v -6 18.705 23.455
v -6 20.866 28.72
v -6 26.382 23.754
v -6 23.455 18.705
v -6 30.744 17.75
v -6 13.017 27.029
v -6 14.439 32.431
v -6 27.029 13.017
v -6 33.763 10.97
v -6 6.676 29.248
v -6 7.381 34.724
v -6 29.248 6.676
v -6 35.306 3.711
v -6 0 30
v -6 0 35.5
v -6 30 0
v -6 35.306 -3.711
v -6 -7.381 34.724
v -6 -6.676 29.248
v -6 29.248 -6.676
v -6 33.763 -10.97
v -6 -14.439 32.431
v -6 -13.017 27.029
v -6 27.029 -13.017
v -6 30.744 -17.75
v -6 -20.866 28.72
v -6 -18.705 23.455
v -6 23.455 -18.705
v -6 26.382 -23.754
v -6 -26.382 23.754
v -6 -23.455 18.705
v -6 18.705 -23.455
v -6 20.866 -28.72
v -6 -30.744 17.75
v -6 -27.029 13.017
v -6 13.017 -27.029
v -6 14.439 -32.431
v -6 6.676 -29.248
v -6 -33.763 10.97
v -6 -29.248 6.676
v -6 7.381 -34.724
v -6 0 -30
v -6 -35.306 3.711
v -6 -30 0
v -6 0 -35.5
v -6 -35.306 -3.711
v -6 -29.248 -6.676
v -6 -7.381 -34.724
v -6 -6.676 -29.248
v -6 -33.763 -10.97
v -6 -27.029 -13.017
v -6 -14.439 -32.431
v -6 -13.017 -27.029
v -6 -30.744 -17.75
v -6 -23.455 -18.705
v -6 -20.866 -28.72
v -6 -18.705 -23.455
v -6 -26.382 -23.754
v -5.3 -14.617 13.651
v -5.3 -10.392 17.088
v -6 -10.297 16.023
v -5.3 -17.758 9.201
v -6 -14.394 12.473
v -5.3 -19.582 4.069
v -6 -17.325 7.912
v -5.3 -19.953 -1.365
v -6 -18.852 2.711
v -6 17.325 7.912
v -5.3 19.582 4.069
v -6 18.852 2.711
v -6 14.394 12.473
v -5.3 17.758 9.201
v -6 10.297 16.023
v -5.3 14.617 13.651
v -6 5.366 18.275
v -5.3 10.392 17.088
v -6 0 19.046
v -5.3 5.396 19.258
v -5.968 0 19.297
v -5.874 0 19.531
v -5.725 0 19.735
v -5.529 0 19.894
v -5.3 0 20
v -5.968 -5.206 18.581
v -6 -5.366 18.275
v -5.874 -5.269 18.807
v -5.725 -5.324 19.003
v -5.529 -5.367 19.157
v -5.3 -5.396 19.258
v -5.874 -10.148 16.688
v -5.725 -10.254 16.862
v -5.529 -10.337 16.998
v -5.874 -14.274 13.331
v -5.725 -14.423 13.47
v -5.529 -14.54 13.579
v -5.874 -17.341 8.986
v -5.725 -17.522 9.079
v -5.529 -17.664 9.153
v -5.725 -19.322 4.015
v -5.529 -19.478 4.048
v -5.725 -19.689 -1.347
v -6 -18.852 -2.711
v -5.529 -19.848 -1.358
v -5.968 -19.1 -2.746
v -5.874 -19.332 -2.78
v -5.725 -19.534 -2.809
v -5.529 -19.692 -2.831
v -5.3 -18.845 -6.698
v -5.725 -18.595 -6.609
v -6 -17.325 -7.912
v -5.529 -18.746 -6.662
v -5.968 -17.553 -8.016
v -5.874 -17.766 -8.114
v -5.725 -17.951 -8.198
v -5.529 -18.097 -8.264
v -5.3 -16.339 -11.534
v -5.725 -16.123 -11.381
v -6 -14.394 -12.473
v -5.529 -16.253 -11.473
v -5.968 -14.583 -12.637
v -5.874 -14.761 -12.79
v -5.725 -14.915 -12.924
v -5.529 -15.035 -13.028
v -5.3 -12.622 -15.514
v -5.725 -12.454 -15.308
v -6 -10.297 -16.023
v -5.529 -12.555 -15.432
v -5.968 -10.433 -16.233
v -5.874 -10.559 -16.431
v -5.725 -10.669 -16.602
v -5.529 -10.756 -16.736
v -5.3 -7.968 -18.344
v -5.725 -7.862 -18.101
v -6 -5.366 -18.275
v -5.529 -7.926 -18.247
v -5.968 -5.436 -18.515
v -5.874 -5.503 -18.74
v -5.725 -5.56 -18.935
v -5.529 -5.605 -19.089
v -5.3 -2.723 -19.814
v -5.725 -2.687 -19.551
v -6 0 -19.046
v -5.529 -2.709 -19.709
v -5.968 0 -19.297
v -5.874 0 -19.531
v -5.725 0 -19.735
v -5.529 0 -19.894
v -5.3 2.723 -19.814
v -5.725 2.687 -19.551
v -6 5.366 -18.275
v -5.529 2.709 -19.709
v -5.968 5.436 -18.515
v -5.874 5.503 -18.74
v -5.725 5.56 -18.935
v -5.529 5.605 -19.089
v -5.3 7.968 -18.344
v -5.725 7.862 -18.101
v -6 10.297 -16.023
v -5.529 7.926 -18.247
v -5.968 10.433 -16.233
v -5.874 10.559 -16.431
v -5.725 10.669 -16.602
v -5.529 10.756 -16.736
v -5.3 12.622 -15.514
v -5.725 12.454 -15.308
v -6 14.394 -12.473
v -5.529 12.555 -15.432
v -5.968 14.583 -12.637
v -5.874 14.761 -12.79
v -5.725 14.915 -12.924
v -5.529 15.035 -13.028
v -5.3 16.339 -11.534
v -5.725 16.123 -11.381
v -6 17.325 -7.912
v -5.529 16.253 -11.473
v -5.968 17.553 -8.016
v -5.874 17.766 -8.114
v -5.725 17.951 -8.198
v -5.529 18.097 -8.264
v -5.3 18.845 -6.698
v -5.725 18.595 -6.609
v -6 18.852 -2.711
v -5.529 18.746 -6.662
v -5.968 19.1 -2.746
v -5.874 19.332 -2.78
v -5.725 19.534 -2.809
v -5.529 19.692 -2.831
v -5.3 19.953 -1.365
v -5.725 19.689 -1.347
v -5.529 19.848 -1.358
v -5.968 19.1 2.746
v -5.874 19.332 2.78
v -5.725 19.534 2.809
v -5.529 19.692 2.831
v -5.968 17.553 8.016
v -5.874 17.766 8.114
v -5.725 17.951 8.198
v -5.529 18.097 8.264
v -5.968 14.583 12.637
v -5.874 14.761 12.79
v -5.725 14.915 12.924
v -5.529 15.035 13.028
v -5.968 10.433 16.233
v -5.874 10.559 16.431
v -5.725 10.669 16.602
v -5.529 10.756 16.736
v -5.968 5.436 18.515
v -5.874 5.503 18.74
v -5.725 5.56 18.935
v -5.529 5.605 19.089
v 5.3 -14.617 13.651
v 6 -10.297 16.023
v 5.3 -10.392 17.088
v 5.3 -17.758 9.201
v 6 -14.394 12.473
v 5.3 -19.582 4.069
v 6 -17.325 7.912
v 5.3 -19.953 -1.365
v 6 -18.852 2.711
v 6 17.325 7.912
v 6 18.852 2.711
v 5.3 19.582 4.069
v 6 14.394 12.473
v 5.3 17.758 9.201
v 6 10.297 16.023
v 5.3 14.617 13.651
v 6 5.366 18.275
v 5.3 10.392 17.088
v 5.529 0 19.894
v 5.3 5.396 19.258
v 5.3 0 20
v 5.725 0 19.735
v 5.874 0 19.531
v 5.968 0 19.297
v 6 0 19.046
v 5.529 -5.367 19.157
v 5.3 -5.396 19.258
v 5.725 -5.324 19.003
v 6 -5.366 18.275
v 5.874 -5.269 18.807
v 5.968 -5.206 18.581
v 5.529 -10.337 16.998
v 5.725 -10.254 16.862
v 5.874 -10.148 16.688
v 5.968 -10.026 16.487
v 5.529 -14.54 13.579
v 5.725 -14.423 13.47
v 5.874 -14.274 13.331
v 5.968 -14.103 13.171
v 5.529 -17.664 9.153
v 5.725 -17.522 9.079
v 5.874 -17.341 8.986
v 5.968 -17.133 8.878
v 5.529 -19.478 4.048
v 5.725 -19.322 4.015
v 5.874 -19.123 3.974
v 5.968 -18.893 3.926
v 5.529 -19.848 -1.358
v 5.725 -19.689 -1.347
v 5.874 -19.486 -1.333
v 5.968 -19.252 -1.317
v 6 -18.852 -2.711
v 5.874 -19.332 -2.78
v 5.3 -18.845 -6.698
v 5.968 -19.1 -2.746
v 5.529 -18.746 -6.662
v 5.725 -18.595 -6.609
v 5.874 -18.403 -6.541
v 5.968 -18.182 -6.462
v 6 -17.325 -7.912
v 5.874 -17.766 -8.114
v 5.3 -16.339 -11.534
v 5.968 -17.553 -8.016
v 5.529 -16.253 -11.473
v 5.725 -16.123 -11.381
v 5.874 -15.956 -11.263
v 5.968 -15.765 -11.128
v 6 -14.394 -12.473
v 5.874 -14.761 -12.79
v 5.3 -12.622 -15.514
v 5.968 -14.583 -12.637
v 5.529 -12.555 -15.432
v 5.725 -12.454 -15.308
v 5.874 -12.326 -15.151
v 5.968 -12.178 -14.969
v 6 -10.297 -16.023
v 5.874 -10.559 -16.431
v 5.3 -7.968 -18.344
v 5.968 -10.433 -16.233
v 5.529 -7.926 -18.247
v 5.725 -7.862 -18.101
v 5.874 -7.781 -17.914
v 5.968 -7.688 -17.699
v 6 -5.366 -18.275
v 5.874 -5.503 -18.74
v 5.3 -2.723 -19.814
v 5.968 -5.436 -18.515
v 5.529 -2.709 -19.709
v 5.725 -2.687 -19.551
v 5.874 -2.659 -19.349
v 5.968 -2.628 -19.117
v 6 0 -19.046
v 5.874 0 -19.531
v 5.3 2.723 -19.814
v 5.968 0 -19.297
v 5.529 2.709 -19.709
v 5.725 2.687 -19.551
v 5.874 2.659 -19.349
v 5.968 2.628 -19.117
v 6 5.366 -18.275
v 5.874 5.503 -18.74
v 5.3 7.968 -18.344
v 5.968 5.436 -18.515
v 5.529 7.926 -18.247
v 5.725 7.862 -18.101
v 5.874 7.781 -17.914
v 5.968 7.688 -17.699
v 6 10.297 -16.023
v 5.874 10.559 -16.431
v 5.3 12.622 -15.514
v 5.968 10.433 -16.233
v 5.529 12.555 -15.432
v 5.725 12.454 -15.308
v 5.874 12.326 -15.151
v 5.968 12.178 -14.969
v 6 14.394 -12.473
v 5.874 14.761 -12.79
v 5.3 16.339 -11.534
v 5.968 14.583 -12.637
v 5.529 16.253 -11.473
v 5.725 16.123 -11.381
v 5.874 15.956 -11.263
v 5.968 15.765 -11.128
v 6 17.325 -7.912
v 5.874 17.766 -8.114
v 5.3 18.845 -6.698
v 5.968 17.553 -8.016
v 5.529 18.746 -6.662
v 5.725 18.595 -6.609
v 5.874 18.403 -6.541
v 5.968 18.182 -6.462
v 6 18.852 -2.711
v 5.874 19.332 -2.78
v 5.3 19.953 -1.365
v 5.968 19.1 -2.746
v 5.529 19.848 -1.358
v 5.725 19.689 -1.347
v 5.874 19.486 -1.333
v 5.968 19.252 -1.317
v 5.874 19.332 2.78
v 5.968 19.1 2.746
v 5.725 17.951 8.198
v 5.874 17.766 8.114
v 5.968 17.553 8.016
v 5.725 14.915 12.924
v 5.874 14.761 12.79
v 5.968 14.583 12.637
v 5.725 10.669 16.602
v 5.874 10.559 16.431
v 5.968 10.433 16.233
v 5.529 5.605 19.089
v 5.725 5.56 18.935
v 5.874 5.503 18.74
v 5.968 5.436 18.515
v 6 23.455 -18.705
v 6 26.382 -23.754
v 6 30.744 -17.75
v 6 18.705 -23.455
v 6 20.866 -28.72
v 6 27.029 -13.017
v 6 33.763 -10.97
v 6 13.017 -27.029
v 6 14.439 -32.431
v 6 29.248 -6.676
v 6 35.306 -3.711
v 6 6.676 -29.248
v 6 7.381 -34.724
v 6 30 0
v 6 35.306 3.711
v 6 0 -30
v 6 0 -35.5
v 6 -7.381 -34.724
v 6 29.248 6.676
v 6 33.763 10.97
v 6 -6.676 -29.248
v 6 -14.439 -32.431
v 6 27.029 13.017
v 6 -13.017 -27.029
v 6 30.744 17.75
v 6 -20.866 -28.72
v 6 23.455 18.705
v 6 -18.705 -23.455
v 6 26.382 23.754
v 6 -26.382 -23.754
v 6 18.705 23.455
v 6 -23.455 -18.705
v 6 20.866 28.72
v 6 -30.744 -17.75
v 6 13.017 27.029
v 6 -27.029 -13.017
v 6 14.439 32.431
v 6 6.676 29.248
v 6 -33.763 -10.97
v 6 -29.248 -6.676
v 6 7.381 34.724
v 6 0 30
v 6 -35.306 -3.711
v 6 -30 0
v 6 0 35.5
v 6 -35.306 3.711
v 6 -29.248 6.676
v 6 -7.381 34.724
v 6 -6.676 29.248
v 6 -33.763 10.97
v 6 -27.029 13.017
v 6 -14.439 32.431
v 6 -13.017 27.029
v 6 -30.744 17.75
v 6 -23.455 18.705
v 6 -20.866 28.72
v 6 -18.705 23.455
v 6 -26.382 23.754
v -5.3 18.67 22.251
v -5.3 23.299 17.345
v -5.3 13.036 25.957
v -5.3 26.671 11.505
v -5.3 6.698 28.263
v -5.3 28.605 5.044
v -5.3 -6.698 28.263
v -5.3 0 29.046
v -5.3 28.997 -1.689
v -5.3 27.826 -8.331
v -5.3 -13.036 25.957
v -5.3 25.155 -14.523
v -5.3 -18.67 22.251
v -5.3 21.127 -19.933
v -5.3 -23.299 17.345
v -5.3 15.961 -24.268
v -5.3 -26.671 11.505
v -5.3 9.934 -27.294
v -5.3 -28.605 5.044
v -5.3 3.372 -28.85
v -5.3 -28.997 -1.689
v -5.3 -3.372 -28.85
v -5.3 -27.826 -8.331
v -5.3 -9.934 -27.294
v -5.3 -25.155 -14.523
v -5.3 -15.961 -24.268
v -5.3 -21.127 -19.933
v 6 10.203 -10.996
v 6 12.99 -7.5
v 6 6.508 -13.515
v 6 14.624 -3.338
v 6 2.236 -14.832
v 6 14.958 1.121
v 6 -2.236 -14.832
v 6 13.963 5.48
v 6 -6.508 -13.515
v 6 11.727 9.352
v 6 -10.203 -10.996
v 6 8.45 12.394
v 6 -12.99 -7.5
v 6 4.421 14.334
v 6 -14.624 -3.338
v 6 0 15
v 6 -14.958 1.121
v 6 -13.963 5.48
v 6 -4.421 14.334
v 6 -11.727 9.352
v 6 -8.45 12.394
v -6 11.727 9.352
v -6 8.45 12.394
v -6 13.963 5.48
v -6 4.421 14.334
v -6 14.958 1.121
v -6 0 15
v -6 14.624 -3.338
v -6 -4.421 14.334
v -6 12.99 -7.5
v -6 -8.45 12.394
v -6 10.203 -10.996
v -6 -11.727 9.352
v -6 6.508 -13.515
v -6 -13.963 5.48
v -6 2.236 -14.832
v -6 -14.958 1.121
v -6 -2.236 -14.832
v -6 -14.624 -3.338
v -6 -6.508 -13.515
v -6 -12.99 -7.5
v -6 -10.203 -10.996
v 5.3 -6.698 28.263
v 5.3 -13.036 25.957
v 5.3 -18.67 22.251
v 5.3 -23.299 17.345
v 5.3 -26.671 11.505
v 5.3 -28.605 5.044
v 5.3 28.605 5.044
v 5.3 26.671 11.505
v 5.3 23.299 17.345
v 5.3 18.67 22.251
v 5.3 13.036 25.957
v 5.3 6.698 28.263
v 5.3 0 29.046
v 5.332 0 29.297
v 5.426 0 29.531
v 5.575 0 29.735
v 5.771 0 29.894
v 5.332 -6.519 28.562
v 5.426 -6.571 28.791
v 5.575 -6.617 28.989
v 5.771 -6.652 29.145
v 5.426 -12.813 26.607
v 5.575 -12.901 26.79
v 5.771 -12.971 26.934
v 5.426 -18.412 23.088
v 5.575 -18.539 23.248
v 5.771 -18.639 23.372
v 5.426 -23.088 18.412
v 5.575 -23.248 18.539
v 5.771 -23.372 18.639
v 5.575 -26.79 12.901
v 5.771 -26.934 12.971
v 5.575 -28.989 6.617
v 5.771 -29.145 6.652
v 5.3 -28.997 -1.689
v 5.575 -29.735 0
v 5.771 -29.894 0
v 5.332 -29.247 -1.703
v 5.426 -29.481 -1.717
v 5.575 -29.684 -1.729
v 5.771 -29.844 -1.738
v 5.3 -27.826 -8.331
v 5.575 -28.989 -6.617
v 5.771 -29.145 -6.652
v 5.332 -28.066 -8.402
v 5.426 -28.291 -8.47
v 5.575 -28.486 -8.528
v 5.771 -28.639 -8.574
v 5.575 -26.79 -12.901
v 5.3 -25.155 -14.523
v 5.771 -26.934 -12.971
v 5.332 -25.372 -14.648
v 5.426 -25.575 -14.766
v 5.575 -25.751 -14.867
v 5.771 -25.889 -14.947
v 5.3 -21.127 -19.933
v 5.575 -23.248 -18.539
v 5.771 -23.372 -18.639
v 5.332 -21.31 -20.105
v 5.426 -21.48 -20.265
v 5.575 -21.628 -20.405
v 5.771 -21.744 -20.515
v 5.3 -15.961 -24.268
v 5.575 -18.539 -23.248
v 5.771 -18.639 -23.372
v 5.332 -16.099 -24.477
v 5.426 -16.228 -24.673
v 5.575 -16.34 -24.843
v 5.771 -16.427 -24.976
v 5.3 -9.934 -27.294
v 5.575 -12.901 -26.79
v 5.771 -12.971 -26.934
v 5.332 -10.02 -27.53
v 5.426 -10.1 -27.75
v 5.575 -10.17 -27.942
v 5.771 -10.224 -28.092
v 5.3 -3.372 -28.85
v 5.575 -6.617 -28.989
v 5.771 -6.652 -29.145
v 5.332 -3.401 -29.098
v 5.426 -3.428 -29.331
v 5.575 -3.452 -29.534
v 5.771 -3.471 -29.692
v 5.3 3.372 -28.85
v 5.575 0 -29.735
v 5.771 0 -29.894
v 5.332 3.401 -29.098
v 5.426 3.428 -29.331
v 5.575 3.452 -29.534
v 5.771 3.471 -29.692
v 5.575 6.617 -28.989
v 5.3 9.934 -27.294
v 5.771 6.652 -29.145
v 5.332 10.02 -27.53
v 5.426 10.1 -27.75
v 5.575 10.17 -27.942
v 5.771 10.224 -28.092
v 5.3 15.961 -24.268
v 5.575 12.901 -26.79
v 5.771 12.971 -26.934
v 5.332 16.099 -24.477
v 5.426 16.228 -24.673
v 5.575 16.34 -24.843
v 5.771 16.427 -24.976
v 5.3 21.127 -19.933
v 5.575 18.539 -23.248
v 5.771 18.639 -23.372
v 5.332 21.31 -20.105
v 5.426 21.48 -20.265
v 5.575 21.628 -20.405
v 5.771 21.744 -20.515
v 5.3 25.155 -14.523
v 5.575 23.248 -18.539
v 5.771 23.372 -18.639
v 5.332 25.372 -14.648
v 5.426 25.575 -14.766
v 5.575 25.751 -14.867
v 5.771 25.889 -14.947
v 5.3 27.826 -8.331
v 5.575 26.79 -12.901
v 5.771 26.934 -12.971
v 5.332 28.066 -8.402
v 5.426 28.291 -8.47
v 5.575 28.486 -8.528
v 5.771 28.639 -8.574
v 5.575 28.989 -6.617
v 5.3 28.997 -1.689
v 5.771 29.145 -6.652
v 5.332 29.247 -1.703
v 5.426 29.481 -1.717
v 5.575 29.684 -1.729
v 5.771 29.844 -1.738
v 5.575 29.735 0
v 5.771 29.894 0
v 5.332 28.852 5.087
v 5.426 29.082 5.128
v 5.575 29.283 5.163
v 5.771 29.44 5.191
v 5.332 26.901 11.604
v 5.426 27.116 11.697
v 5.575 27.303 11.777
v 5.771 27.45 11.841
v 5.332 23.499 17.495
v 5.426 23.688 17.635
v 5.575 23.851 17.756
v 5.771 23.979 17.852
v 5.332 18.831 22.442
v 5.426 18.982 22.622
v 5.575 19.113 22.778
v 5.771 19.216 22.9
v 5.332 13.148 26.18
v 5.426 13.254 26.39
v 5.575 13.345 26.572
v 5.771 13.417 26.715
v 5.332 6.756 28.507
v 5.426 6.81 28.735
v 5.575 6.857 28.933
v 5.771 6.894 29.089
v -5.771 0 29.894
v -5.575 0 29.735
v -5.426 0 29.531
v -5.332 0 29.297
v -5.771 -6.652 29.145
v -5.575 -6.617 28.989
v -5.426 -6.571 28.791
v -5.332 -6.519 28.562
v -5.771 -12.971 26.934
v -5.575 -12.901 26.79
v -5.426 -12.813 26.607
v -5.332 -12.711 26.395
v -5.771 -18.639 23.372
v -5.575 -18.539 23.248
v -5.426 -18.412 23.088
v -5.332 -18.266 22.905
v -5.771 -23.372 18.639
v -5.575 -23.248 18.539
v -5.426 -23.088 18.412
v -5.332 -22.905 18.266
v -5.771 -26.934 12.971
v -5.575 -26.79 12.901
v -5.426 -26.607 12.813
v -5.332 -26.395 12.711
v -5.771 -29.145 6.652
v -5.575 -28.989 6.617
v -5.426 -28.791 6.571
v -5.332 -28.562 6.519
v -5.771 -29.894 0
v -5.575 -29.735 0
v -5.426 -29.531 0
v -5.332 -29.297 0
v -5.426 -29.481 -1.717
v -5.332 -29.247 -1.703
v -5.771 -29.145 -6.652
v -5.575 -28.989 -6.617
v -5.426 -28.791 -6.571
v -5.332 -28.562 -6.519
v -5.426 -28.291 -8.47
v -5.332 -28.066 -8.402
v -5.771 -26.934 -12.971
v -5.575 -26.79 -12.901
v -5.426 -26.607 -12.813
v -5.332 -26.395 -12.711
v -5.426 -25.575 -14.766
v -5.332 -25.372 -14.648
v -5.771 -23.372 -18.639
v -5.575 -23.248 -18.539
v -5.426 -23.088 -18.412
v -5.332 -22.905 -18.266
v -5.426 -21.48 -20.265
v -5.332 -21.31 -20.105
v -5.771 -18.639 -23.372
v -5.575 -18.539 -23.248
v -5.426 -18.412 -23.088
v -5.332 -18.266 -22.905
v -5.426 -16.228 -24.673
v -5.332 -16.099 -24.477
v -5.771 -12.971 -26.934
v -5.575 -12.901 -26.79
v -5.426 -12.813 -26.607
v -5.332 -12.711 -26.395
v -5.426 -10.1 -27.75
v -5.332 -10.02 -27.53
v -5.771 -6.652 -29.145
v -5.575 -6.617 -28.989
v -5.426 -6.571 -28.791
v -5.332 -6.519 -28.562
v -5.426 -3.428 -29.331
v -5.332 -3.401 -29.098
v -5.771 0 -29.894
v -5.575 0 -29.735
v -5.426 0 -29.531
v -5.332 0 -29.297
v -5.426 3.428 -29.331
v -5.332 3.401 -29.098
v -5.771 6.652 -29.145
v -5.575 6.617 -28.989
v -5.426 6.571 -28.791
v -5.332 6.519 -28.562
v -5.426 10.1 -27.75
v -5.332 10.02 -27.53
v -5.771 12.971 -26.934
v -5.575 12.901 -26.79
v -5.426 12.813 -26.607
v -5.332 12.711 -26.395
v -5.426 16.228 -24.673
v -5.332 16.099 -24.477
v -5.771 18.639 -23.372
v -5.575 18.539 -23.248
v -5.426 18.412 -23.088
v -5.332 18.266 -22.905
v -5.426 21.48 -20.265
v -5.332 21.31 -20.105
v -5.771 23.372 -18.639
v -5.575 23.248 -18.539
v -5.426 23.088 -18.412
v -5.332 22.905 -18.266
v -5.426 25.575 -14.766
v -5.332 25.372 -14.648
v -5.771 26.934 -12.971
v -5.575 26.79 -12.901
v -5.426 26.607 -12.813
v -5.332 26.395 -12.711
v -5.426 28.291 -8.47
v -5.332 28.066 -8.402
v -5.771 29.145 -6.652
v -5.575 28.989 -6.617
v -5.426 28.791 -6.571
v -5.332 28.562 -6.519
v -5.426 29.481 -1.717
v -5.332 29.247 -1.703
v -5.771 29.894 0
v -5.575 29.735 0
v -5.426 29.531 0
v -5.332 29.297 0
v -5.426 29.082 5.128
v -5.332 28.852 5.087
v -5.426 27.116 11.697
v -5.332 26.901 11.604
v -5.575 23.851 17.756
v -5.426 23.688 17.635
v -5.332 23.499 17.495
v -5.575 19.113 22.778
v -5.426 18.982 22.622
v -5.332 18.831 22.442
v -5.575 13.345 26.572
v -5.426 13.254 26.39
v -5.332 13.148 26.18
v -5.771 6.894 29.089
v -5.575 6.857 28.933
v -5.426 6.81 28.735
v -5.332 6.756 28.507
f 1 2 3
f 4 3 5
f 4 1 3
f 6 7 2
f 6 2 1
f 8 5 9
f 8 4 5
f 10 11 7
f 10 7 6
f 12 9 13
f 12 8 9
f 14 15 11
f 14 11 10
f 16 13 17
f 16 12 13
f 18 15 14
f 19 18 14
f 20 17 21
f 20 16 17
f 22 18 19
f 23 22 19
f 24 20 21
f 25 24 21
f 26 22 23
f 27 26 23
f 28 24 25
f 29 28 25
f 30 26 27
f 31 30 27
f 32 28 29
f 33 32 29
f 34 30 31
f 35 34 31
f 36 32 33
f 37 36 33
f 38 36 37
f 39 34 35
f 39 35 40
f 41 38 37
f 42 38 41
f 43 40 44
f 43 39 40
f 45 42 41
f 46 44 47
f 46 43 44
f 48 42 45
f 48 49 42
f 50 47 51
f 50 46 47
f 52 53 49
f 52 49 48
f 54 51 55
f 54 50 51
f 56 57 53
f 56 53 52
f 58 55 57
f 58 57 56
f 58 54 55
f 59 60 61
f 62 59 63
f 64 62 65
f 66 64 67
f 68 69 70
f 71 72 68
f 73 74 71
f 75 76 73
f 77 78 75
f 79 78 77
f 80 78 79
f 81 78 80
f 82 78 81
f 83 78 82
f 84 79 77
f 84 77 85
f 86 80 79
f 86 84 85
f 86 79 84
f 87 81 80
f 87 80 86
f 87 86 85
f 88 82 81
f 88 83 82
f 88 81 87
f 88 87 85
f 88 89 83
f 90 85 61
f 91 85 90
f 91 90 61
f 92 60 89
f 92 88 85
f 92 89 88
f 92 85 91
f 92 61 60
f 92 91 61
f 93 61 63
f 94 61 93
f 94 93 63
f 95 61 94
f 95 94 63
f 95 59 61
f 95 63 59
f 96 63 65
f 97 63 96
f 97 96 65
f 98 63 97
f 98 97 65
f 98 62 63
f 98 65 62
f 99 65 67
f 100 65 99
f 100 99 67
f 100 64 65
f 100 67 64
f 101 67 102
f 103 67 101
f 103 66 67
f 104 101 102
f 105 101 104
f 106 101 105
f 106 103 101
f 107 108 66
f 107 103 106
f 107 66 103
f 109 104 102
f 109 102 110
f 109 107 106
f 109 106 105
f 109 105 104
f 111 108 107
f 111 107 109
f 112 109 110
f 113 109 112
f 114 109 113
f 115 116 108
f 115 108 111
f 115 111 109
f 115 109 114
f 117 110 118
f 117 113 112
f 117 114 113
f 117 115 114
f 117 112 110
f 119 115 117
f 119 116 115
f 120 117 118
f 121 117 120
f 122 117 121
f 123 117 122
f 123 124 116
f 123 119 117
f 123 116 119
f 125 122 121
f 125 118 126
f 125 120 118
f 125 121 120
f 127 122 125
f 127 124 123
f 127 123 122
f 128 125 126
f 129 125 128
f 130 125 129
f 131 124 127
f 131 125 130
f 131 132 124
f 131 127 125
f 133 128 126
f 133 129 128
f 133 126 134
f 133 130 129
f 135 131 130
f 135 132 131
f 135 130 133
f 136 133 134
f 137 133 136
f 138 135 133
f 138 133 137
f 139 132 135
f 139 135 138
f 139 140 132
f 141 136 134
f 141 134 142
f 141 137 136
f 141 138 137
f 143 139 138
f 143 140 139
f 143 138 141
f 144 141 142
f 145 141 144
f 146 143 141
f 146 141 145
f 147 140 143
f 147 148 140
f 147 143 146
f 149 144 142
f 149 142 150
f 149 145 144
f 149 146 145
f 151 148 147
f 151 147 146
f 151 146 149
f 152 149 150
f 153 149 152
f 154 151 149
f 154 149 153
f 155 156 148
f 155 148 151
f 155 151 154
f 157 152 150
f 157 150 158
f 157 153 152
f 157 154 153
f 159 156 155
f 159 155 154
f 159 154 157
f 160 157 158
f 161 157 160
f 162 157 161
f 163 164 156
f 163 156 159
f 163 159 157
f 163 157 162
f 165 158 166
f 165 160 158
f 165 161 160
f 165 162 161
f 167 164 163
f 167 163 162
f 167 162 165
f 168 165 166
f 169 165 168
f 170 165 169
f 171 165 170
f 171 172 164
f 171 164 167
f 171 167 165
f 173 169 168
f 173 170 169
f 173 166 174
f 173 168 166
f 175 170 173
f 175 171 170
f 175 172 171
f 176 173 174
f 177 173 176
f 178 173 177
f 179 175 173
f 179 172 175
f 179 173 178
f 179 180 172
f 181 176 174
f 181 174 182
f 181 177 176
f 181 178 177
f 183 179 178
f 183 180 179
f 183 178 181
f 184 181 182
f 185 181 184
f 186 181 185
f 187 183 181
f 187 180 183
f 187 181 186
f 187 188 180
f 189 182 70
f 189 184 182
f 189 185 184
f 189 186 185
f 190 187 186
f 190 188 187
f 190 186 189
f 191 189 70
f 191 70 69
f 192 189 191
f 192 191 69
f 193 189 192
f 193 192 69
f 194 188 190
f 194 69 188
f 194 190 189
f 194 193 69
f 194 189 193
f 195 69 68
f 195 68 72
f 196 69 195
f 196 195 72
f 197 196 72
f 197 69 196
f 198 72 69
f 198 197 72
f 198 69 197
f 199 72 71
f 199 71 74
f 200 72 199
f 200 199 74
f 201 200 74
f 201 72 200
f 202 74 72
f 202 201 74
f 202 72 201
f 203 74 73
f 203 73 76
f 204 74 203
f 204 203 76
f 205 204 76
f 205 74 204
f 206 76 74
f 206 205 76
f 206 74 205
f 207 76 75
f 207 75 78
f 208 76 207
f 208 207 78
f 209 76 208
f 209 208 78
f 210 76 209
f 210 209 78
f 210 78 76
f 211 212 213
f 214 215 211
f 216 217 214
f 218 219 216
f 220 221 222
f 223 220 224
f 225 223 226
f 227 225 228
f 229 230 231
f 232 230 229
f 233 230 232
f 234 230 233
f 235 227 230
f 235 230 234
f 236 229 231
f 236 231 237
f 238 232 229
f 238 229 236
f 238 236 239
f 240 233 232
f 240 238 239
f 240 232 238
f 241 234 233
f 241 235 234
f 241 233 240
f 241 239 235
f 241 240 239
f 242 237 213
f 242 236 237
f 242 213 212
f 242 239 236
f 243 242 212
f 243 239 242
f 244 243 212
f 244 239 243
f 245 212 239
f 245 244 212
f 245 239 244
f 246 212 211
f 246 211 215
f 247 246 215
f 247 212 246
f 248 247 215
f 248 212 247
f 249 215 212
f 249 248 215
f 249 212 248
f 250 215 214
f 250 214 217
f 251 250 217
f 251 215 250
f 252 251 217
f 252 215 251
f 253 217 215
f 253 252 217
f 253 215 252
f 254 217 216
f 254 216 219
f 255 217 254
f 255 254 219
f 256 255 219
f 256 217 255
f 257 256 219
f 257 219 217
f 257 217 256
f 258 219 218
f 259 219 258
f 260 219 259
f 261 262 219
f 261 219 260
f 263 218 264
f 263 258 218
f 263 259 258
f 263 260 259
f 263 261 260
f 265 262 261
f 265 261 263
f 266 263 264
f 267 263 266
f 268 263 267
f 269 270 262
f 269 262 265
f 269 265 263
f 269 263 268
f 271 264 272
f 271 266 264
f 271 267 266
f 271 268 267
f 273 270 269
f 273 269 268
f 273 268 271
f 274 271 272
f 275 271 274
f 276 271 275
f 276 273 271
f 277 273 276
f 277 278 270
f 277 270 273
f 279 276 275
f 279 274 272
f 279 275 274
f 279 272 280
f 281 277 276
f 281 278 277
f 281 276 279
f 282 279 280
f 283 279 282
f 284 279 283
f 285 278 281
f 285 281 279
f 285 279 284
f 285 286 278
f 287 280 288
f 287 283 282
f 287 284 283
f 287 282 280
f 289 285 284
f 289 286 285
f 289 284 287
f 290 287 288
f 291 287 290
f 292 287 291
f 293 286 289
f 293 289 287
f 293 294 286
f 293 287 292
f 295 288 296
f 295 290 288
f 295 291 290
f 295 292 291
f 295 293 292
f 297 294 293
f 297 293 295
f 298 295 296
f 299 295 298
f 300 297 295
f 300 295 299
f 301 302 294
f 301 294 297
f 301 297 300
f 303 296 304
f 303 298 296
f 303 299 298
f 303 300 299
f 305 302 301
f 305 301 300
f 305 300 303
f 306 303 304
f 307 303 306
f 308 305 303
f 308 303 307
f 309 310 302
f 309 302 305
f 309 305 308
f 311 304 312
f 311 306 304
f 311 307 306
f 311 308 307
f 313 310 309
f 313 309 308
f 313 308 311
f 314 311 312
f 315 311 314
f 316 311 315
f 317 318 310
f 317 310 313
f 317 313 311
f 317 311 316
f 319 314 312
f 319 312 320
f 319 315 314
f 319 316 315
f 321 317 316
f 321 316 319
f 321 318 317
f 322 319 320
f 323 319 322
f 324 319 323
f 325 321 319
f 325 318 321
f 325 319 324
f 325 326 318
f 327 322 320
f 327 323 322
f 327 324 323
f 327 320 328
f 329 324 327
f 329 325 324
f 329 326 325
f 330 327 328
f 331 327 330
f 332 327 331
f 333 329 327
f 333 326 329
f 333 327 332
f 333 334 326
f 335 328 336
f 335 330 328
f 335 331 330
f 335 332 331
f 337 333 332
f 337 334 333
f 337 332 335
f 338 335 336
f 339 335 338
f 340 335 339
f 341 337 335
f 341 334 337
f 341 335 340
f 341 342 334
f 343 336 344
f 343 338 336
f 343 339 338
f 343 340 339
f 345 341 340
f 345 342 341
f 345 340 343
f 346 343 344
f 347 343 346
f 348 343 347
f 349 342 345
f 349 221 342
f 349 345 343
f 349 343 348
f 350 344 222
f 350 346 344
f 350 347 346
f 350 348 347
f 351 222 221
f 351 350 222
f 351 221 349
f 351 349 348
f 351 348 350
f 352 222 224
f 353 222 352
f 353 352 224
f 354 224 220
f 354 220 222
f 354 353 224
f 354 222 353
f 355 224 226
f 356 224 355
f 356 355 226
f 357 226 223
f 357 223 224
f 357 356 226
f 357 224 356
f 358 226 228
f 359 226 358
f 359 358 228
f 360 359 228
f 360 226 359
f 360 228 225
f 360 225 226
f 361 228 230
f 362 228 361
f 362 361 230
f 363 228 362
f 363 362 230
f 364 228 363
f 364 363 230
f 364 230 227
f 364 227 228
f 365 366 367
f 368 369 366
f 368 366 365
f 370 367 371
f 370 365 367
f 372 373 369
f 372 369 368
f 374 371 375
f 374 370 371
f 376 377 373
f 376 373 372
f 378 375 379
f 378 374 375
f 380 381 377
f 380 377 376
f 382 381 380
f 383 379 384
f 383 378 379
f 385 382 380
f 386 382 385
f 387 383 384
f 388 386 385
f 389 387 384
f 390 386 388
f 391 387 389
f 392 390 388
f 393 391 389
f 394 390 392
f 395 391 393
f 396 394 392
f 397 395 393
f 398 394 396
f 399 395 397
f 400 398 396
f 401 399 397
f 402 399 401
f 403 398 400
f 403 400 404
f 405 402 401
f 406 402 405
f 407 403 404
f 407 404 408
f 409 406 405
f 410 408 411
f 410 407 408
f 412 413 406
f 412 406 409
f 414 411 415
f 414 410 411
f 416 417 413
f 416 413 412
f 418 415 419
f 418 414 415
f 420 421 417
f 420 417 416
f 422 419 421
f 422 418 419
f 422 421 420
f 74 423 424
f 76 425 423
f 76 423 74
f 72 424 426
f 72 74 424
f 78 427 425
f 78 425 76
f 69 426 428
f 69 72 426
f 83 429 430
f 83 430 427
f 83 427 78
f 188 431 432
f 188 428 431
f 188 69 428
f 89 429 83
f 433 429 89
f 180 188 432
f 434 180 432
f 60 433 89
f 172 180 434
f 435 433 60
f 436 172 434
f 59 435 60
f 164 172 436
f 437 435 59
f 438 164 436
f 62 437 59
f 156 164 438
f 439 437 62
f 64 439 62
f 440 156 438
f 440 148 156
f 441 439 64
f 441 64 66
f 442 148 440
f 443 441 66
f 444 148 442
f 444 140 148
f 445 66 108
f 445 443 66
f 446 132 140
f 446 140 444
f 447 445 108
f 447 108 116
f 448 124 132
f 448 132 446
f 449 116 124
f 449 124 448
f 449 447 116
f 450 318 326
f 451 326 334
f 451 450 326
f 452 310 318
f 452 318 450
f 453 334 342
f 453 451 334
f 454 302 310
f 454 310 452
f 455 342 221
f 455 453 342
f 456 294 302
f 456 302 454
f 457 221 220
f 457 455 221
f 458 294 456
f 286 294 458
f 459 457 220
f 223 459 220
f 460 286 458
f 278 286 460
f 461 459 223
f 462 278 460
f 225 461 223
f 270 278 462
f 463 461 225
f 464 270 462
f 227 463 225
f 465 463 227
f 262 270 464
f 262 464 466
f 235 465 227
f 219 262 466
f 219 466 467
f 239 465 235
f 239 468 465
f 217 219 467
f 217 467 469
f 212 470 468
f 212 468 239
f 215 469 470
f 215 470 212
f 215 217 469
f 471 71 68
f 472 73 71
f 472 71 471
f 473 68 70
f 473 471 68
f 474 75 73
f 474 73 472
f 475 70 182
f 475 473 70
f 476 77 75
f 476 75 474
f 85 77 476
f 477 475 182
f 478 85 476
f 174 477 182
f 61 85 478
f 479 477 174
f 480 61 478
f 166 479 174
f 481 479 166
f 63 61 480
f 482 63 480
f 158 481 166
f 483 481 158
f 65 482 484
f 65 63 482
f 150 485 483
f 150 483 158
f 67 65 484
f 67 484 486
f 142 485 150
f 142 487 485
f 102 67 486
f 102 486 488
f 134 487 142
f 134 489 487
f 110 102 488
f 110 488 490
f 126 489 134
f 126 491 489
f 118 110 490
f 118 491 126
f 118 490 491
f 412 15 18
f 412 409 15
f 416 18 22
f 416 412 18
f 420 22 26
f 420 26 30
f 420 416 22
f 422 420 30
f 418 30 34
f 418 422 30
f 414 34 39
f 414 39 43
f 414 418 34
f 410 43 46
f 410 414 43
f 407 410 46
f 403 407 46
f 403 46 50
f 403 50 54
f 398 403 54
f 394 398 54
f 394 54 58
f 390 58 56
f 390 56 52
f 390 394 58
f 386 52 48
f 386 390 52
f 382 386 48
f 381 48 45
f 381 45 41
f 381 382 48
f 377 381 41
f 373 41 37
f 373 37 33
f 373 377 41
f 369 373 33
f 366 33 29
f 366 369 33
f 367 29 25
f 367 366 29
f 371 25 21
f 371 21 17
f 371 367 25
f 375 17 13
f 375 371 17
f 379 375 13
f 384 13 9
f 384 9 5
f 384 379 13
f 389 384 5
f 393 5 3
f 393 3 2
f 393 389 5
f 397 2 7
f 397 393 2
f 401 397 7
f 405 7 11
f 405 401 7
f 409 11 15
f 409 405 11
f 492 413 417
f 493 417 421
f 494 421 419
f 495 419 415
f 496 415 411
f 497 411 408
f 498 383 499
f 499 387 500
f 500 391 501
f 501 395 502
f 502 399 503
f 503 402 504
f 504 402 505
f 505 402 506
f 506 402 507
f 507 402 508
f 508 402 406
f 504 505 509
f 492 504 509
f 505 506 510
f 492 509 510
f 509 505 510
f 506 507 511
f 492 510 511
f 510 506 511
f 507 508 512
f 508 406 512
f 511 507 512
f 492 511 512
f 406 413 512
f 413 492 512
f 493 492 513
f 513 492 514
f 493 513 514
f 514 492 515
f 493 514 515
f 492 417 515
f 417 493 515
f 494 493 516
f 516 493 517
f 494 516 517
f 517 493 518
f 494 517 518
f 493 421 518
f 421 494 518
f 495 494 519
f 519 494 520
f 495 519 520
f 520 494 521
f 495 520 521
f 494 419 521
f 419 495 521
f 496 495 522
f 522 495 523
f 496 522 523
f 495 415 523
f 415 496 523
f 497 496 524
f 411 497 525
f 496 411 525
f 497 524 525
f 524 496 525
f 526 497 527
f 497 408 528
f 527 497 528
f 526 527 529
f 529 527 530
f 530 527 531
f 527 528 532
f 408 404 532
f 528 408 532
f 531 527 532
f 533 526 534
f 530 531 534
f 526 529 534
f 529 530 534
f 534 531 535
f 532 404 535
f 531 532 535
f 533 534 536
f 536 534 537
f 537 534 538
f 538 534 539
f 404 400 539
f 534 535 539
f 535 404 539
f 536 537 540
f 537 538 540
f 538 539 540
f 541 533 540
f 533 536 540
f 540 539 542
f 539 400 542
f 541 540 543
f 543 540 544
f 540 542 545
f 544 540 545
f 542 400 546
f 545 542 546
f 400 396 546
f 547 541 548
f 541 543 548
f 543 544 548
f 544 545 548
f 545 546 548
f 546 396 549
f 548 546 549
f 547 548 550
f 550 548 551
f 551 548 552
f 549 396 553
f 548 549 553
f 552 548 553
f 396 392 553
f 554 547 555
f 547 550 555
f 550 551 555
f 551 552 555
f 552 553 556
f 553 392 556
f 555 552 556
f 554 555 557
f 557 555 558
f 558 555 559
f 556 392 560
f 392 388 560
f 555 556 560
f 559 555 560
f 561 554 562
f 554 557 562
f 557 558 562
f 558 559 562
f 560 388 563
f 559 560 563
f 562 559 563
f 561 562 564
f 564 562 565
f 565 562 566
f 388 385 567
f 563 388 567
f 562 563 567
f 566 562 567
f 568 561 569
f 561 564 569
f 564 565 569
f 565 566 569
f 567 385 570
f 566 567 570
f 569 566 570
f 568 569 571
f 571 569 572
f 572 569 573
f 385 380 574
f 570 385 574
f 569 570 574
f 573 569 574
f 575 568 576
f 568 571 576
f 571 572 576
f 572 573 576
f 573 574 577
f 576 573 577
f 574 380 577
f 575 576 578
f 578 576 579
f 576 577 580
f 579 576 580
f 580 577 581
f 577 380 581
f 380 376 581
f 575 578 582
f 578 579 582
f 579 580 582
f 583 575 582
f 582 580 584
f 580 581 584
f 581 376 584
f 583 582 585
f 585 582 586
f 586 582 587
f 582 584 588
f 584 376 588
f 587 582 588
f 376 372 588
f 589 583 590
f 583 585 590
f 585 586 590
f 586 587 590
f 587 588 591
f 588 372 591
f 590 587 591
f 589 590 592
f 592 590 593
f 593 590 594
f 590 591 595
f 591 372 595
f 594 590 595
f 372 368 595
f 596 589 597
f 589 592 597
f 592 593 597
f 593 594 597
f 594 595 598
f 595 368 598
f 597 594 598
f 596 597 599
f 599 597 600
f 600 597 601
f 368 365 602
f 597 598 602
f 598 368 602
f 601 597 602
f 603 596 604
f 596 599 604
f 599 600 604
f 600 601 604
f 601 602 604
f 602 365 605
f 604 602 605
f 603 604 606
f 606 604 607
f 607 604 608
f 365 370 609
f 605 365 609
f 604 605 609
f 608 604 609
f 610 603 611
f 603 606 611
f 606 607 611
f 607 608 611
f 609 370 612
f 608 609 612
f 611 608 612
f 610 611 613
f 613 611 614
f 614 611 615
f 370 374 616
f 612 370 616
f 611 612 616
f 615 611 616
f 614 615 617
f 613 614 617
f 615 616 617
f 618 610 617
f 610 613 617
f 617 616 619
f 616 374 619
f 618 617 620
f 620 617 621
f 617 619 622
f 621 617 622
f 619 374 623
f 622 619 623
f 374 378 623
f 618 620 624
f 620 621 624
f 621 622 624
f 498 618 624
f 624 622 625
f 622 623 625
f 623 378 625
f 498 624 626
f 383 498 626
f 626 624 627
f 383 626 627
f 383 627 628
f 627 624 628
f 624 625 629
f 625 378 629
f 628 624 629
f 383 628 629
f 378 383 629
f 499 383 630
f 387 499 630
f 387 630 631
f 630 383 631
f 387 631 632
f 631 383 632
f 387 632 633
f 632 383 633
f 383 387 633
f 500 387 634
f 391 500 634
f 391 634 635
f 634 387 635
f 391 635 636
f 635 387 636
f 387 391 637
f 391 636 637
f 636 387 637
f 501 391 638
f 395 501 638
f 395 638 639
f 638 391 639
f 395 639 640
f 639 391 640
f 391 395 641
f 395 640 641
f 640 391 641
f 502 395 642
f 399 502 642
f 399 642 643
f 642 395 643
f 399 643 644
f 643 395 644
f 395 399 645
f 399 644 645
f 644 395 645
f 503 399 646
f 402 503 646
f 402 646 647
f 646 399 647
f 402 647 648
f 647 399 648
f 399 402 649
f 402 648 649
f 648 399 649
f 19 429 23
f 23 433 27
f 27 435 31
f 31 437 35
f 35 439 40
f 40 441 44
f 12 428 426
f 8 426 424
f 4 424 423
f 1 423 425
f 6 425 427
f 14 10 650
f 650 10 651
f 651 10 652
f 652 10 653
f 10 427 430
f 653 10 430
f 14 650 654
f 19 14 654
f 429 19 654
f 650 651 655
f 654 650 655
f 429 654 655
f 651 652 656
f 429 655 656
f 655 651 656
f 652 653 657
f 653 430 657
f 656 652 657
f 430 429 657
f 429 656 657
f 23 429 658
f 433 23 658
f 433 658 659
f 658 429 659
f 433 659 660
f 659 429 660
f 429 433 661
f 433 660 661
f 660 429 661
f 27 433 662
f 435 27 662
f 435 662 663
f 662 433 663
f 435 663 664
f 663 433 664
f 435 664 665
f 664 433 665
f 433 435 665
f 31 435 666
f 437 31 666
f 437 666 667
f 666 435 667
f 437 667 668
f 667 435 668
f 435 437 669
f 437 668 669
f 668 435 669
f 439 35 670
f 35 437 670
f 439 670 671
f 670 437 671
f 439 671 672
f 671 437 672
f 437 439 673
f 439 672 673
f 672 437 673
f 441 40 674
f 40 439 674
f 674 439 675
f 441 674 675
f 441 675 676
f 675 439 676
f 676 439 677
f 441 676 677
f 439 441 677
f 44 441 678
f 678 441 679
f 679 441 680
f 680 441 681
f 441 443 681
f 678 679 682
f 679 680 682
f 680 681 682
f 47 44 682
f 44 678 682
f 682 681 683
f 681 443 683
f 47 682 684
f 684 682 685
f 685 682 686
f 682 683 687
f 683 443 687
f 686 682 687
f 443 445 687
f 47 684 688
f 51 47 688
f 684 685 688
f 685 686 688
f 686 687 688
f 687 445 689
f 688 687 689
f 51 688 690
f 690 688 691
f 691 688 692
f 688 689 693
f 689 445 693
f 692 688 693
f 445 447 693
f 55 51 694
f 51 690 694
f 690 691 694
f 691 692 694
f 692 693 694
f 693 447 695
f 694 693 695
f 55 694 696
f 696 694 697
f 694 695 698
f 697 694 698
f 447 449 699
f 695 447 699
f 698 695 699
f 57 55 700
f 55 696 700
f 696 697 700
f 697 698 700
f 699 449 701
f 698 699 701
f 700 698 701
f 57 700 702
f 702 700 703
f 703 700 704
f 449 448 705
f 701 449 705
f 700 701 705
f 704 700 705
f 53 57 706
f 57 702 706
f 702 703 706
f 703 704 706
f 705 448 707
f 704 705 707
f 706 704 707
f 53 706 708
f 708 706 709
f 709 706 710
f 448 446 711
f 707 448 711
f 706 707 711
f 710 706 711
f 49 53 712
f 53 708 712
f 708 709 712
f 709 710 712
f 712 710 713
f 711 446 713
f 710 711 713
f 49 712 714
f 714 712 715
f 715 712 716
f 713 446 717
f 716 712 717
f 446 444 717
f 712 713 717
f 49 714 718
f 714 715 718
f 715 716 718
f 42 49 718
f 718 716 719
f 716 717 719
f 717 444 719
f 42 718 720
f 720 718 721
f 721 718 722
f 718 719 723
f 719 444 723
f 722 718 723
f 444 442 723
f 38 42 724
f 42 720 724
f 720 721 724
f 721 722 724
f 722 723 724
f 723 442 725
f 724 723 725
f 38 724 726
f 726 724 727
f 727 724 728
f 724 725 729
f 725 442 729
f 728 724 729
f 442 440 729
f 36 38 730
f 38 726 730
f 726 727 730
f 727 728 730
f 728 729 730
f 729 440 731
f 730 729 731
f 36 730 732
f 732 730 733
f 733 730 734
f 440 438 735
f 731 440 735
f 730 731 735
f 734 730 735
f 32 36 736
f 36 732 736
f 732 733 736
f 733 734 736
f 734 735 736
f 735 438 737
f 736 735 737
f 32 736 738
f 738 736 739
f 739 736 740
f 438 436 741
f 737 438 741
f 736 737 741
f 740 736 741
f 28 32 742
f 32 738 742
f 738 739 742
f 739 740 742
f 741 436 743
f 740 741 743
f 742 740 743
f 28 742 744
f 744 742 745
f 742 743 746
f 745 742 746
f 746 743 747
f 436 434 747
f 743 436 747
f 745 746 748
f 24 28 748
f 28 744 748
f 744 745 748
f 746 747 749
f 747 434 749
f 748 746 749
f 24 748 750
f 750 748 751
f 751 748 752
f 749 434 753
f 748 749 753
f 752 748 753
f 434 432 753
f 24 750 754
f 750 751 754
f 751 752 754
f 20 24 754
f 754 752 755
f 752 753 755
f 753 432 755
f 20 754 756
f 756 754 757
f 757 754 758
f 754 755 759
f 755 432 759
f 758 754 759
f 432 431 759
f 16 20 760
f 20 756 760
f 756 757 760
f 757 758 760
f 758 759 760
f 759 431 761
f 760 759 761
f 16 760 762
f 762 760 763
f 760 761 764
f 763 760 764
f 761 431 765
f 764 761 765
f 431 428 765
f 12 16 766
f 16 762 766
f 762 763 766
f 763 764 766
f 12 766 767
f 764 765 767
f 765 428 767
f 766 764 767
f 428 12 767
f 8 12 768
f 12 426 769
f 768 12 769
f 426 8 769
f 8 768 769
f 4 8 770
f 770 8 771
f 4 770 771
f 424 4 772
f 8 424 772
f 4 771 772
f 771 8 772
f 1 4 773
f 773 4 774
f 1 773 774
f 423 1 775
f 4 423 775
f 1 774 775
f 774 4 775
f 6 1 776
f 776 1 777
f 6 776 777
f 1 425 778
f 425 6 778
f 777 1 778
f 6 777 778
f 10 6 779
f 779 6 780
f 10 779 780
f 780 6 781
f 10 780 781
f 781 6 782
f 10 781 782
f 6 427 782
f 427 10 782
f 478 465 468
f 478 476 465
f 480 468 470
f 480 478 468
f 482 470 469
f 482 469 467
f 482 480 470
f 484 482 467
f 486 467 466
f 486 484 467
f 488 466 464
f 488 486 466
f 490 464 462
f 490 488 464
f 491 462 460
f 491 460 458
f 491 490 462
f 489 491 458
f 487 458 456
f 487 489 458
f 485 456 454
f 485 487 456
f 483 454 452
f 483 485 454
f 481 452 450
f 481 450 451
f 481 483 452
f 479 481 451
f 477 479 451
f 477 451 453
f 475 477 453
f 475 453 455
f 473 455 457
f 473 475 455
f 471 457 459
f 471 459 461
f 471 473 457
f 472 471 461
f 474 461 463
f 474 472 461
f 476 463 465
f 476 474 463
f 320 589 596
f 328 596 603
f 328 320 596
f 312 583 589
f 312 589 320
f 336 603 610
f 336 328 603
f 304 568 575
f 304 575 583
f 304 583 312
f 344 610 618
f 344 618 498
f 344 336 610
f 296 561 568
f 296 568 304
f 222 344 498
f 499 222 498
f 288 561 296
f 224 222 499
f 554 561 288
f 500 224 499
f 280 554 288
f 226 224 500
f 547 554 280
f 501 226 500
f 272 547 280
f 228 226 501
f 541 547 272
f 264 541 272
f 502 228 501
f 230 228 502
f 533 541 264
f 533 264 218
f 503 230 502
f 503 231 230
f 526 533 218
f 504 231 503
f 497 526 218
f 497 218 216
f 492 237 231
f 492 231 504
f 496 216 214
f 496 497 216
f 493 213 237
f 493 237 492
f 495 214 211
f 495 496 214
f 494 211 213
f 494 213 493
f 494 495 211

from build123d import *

# Parameters (mm, degrees)
FILLET1_R = 1


with BuildPart() as part:
    # Sketch3 → Revolve1 (revolve)
    with BuildSketch(Plane.XY, mode=Mode.PRIVATE) as revolve1_sk:
        Polygon((6, 15), (-6, 15), (-6, 20), (-5.3, 20), (-5.3, 30), (-6, 30), (-6, 35.5), (6, 35.5), (6, 30), (5.3, 30), (5.3, 20), (6, 20), align=None)
    revolve(revolve1_sk.sketch.rotate(Axis((-14.54061226, 0, 0), (1, 0, 0)), 90), axis=Axis((-14.54061226, 0, 0), (1, 0, 0)))

    # Fillet1
    # the kernel refuses this fillet: 1 mm, written as the material it adds along each edge
    with BuildSketch(Plane(origin=(5.3, 0, 0), x_dir=(0, 0, 1), z_dir=(0, 1, 0))) as fillet1_piece_1:
        with BuildLine():
            CenterArc((29.046060799, 1), FILLET1_R, 270, 72.542396876)
            Line((29.046060799, 0), (29.046060799, -0.02))
            Line((29.046060799, -0.02), (30, -0.02))
            Line((30, -0.02), (30.02, 0))
            ThreePointArc((30.02, 0), (30.02, 0.35), (30.019078784, 0.694))
            Line((30.019078784, 0.694), (30, 0.7))
        make_face()
    revolve(axis=Axis((5.3, 0, 0), (1, 0, 0)))
    with BuildSketch(Plane(origin=(-5.3, 0, 0), x_dir=(0, 0, 1), z_dir=(0, 1, 0))) as fillet1_piece_2:
        with BuildLine():
            CenterArc((29.046060799, -1), FILLET1_R, 17.457603124, 72.542396876)
            Line((30, -0.7), (30.019078784, -0.694))
            ThreePointArc((30.019078784, -0.694), (30.02, -0.35), (30.02, 0))
            Line((30.02, 0), (30, 0.02))
            Line((30, 0.02), (29.046060799, 0.02))
            Line((29.046060799, 0.02), (29.046060799, 0))
        make_face()
    revolve(axis=Axis((-5.3, 0, 0), (1, 0, 0)))
    # the kernel refuses this fillet: 1 mm, written as the material it takes off along each edge
    with BuildSketch(Plane(origin=(6, 0, 0), x_dir=(0, 0, 1), z_dir=(0, 1, 0))) as fillet1_2_piece_1:
        with BuildLine():
            CenterArc((19.046060799, -1), FILLET1_R, 17.457603124, 72.542396876)
            Line((20, -0.7), (20.019078784, -0.694))
            ThreePointArc((20.019078784, -0.694), (20.02, -0.35), (20.02, 0))
            Line((20.02, 0), (20, 0.02))
            Line((20, 0.02), (19.046060799, 0.02))
            Line((19.046060799, 0.02), (19.046060799, 0))
        make_face()
    revolve(axis=Axis((6, 0, 0), (1, 0, 0)), mode=Mode.SUBTRACT)
    with BuildSketch(Plane(origin=(-6, 0, 0), x_dir=(0, 0, 1), z_dir=(0, 1, 0))) as fillet1_2_piece_2:
        with BuildLine():
            CenterArc((19.046060799, 1), FILLET1_R, 270, 72.542396876)
            Line((20, 0.7), (20.019078784, 0.694))
            ThreePointArc((20.019078784, 0.694), (20.02, 0.35), (20.02, 0))
            Line((20.02, 0), (20, -0.02))
            Line((20, -0.02), (19.046060799, -0.02))
            Line((19.046060799, -0.02), (19.046060799, 0))
        make_face()
    revolve(axis=Axis((-6, 0, 0), (1, 0, 0)), mode=Mode.SUBTRACT)


solid = part.part
